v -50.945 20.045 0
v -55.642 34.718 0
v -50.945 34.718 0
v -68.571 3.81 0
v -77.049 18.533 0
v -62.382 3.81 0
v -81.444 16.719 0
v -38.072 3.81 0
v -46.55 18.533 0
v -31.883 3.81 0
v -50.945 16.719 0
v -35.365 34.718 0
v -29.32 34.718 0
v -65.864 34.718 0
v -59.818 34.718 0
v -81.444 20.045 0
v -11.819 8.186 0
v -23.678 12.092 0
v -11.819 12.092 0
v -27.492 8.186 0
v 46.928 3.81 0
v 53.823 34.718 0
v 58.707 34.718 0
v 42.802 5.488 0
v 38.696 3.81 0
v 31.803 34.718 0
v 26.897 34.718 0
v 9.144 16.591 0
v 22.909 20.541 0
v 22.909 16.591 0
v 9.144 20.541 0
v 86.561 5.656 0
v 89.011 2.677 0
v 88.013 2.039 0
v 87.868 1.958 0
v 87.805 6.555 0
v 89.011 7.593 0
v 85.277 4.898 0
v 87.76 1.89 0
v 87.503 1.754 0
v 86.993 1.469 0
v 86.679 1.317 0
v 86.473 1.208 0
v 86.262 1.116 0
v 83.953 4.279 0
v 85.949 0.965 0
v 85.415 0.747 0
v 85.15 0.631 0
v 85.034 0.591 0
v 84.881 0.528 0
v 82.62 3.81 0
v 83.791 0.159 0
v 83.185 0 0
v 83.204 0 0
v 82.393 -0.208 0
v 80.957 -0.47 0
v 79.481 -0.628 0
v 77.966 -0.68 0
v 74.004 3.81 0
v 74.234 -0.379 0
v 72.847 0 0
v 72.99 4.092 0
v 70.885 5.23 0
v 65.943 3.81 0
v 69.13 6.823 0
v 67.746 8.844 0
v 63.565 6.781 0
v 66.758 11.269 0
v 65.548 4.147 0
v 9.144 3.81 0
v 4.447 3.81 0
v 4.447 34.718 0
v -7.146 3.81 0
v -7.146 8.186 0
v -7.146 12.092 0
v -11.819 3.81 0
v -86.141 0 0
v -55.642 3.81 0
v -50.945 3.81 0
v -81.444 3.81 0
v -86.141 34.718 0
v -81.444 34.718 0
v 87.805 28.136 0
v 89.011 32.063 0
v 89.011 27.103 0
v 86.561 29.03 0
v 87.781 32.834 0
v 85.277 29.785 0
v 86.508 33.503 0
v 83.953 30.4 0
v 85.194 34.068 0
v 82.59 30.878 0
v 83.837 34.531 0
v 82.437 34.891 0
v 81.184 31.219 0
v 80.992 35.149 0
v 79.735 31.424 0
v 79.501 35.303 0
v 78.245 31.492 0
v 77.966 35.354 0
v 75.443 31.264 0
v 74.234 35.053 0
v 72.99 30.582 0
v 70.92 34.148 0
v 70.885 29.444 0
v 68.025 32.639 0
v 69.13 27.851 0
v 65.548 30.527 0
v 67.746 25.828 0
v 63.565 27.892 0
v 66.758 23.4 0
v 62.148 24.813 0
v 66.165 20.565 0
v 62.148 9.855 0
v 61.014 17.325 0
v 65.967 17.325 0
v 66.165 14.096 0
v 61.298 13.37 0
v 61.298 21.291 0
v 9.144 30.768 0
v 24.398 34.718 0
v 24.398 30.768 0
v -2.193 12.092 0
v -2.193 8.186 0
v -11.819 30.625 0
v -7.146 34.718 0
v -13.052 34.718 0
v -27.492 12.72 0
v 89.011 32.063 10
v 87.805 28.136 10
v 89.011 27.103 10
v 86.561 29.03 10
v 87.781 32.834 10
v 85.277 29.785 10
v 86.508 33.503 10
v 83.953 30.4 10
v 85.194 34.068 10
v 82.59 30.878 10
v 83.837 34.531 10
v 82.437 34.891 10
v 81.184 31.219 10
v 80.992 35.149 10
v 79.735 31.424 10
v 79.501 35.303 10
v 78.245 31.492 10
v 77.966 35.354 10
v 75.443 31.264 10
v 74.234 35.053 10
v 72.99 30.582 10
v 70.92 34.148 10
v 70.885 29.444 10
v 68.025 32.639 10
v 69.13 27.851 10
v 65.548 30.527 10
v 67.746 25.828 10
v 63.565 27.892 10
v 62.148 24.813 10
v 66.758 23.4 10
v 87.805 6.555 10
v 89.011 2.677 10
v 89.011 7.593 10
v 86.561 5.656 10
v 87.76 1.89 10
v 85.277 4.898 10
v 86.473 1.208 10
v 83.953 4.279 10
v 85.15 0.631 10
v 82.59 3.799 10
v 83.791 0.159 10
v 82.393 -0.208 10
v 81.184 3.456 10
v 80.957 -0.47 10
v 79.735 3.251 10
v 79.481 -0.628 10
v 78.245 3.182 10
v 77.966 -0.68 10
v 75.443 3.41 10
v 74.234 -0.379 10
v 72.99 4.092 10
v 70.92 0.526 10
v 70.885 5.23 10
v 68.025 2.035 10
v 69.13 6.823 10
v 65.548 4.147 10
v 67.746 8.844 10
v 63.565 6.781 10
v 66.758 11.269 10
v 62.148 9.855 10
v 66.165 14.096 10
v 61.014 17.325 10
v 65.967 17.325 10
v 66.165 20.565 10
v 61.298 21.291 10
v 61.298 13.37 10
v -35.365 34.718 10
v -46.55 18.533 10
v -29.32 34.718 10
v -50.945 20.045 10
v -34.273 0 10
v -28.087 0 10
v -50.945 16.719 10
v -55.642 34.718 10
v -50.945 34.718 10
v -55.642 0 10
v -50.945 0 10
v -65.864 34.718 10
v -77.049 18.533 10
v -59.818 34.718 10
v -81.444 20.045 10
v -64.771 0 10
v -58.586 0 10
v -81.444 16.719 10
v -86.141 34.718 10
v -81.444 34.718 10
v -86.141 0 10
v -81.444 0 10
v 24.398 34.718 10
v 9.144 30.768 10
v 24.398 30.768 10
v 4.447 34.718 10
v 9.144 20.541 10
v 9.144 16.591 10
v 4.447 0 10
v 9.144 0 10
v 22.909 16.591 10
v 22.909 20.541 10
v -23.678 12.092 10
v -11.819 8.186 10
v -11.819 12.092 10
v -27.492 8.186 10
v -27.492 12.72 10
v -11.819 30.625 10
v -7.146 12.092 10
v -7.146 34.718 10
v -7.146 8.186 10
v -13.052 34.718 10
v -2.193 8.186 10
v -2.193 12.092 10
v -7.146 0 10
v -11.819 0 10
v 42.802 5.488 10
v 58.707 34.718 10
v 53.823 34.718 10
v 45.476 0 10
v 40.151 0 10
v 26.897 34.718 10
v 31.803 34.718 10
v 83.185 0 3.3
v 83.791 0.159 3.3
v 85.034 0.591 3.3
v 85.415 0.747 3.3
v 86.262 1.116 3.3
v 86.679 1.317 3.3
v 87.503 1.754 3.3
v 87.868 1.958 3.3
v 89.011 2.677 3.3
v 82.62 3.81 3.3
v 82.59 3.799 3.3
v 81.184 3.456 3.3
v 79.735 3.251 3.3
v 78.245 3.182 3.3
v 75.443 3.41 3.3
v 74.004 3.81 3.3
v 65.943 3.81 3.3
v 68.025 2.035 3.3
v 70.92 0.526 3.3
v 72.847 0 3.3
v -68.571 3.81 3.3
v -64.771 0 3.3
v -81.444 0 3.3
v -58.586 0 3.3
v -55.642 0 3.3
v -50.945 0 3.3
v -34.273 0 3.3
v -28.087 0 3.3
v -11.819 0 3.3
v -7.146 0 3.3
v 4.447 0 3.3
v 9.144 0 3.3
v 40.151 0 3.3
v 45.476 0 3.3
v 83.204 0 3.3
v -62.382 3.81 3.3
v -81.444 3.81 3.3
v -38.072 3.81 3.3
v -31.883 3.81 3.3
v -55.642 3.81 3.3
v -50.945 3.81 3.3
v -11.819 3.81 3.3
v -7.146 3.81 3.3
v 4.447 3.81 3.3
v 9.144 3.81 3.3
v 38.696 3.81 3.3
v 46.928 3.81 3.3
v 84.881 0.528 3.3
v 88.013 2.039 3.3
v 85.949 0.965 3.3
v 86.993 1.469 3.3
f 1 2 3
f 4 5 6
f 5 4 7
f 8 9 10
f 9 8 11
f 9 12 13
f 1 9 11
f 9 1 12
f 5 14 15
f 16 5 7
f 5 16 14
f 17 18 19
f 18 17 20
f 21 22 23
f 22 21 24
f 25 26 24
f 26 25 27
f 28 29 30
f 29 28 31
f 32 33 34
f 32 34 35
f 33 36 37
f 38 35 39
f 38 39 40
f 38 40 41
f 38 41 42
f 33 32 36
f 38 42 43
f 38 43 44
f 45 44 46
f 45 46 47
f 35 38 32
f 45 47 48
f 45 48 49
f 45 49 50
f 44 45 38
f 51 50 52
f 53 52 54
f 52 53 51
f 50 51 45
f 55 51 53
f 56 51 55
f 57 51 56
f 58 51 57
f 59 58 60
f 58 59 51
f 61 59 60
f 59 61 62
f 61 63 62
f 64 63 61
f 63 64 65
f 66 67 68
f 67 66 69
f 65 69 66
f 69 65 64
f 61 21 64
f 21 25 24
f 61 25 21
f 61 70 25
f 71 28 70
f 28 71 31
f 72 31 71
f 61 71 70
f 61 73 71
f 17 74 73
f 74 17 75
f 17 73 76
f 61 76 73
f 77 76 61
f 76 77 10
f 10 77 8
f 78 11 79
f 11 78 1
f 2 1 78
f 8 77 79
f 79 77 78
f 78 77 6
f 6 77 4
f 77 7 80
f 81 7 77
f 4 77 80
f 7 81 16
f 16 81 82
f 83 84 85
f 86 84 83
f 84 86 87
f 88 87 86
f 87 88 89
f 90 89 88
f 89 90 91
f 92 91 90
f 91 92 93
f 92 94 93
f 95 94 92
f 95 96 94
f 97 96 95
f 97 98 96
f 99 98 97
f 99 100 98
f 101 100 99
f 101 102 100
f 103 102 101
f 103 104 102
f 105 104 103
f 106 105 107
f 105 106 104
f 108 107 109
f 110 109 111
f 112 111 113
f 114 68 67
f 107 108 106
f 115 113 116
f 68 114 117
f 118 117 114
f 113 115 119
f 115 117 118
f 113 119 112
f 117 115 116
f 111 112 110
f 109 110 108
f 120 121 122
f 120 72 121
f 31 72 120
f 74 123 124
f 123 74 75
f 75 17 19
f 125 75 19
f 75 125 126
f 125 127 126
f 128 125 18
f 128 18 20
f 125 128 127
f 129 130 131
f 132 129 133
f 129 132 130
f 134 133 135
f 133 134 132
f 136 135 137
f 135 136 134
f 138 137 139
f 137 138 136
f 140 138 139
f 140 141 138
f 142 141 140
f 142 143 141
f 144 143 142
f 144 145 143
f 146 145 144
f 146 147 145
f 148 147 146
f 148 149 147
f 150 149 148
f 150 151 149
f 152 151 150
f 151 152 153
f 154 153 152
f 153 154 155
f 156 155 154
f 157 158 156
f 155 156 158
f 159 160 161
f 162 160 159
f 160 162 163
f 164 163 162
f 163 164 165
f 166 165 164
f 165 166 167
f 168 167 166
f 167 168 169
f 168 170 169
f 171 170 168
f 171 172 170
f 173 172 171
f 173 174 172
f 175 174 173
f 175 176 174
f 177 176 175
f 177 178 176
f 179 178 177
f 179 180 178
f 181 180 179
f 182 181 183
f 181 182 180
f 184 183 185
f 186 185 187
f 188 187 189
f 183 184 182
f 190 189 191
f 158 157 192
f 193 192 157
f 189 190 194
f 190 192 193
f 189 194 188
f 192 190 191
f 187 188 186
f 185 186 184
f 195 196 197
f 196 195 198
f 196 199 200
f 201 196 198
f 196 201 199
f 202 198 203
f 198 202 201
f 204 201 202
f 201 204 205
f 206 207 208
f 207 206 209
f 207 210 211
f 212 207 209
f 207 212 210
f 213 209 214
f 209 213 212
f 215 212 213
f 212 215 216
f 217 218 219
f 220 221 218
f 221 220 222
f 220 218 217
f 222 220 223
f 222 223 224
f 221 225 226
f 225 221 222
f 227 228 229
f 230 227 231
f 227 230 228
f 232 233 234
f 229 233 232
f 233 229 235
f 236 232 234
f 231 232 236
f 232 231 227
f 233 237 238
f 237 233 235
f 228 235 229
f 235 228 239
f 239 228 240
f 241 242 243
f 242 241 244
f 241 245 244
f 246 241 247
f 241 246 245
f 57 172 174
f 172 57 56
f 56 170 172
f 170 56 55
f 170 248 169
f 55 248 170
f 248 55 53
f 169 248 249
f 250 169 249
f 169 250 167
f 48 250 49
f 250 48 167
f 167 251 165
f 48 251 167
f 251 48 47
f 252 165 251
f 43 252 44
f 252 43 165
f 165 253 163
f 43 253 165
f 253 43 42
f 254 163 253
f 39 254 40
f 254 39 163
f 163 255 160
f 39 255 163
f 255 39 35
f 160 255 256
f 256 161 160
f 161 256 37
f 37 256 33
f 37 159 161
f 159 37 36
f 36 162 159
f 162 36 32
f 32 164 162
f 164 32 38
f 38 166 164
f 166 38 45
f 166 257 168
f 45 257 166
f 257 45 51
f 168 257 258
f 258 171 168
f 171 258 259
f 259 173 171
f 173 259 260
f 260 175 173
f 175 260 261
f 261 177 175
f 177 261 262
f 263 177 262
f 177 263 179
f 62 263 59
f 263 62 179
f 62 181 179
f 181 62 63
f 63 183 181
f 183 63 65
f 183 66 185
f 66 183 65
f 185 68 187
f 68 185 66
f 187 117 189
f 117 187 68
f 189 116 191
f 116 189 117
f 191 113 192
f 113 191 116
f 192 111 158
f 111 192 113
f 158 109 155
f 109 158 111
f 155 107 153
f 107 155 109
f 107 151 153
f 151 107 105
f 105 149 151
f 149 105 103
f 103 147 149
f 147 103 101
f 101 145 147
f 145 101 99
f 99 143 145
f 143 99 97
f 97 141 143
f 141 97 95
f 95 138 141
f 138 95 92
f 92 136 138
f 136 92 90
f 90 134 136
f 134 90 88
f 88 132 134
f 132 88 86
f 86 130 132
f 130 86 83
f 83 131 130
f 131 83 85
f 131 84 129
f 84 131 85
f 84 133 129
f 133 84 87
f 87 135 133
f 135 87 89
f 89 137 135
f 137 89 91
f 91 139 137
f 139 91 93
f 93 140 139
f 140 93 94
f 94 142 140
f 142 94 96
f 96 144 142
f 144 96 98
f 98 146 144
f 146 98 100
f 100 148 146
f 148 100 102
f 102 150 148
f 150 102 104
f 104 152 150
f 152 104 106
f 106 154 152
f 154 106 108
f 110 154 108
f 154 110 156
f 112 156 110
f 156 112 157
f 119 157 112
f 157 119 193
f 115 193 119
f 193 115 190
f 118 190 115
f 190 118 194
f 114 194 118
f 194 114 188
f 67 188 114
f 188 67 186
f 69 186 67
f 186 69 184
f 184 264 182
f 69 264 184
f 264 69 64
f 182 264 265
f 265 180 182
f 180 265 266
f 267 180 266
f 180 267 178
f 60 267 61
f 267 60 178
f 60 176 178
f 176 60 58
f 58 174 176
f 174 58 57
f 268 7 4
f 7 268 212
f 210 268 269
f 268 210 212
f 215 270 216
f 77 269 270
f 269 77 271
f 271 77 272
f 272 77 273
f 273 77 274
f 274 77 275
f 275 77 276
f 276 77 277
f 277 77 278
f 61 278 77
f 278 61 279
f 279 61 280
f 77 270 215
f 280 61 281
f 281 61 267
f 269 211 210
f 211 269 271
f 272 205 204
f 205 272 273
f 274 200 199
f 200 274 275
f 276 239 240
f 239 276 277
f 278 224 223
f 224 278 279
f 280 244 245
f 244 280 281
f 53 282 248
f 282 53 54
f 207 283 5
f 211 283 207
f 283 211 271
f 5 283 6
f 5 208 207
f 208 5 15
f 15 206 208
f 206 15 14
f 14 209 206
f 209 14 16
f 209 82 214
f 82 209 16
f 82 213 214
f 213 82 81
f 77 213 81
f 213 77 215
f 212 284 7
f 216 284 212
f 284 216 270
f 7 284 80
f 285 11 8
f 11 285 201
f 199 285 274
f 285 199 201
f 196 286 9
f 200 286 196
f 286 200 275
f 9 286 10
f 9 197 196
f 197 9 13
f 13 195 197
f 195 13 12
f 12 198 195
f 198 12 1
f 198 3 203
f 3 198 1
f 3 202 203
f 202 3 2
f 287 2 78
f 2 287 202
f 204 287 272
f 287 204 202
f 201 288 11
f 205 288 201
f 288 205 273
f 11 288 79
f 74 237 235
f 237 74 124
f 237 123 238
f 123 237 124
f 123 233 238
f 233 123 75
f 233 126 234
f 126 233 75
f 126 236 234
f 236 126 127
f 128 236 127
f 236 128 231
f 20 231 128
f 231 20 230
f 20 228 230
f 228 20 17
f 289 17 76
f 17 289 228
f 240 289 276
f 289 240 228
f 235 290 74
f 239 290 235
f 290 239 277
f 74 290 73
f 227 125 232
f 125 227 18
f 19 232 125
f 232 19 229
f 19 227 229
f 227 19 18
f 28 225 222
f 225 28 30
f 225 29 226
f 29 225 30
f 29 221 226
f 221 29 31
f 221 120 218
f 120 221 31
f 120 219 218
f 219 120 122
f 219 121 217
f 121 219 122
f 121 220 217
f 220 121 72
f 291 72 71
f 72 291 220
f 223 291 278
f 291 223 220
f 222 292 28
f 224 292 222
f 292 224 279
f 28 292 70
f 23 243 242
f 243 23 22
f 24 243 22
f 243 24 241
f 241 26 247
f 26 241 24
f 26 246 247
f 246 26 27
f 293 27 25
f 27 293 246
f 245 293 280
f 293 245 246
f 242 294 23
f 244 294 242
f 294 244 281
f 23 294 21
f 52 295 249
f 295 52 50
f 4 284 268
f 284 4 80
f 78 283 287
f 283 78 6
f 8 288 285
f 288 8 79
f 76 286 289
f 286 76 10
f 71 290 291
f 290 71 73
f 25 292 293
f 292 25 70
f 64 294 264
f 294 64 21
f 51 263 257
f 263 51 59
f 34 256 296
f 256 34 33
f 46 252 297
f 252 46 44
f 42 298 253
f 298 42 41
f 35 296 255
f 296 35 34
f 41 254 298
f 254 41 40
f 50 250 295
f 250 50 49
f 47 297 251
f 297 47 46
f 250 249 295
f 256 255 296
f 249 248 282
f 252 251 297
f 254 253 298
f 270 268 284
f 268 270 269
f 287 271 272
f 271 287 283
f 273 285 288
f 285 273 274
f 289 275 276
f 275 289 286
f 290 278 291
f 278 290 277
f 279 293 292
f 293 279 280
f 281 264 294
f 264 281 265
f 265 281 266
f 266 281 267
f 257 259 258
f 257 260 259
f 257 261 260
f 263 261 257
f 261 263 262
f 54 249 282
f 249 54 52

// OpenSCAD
//Set the text to render
textstring="KK4FVC";

//Font name, e.g. "Libration Sans", "Aldo", depends on what is available on the platform. In the customizer,choose from about 700 Google Fonts. For an overview please refer: http://www.google.com/fonts
fontname="Passion One"; //[ABeeZee,Abel,Abril Fatface,Aclonica,Acme,Actor,Adamina,Advent Pro,Aguafina Script,Akronim,Aladin,Aldrich,Alef,Alegreya,Alegreya Sans,Alegreya Sans SC,Alegreya SC,Alex Brush,Alfa Slab One,Alice,Alike,Alike Angular,Allan,Allerta,Allerta Stencil,Allura,Almendra,Almendra Display,Almendra SC,Amarante,Amaranth,Amatic SC,Amethysta,Amiri,Anaheim,Andada,Andika,Angkor,Annie Use Your Telescope,Anonymous Pro,Antic,Antic Didone,Antic Slab,Anton,Arapey,Arbutus,Arbutus Slab,Architects Daughter,Archivo Black,Archivo Narrow,Arimo,Arizonia,Armata,Artifika,Arvo,Asap,Asset,Astloch,Asul,Atomic Age,Aubrey,Audiowide,Autour One,Average,Average Sans,Averia Gruesa Libre,Averia Libre,Averia Sans Libre,Averia Serif Libre,Bad Script,Balthazar,Bangers,Basic,Battambang,Baumans,Bayon,Belgrano,Belleza,BenchNine,Bentham,Berkshire Swash,Bevan,Bigelow Rules,Bigshot One,Bilbo,Bilbo Swash Caps,Bitter,Black Ops One,Bokor,Bonbon,Boogaloo,Bowlby One,Bowlby One SC,Brawler,Bree Serif,Bubblegum Sans,Bubbler One,Buda,Buenard,Butcherman,Butterfly Kids,Cabin,Cabin Condensed,Cabin Sketch,Caesar Dressing,Cagliostro,Calligraffitti,Cambay,Cambo,Candal,Cantarell,Cantata One,Cantora One,Capriola,Cardo,Carme,Carrois Gothic,Carrois Gothic SC,Carter One,Caudex,Cedarville Cursive,Ceviche One,Changa One,Chango,Chau Philomene One,Chela One,Chelsea Market,Chenla,Cherry Cream Soda,Cherry Swash,Chewy,Chicle,Chivo,Cinzel,Cinzel Decorative,Clicker Script,Coda,Coda Caption,Codystar,Combo,Comfortaa,Coming Soon,Concert One,Condiment,Content,Contrail One,Convergence,Cookie,Copse,Corben,Courgette,Cousine,Coustard,Covered By Your Grace,Crafty Girls,Creepster,Crete Round,Crimson Text,Croissant One,Crushed,Cuprum,Cutive,Cutive Mono,Damion,Dancing Script,Dangrek,Dawning of a New Day,Days One,Dekko,Delius,Delius Swash Caps,Delius Unicase,Della Respira,Denk One,Devonshire,Dhurjati,Didact Gothic,Diplomata,Diplomata SC,Domine,Donegal One,Doppio One,Dorsa,Dosis,Dr Sugiyama,Droid Sans,Droid Sans Mono,Droid Serif,Duru Sans,Dynalight,Eagle Lake,Eater,EB Garamond,Economica,Ek Mukta,Electrolize,Elsie,Elsie Swash Caps,Emblema One,Emilys Candy,Engagement,Englebert,Enriqueta,Erica One,Esteban,Euphoria Script,Ewert,Exo,Exo 2,Expletus Sans,Fanwood Text,Fascinate,Fascinate Inline,Faster One,Fasthand,Fauna One,Federant,Federo,Felipa,Fenix,Finger Paint,Fira Mono,Fira Sans,Fjalla One,Fjord One,Flamenco,Flavors,Fondamento,Fontdiner Swanky,Forum,Francois One,Freckle Face,Fredericka the Great,Fredoka One,Freehand,Fresca,Frijole,Fruktur,Fugaz One,Gabriela,Gafata,Galdeano,Galindo,Gentium Basic,Gentium Book Basic,Geo,Geostar,Geostar Fill,Germania One,GFS Didot,GFS Neohellenic,Gidugu,Gilda Display,Give You Glory,Glass Antiqua,Glegoo,Gloria Hallelujah,Goblin One,Gochi Hand,Gorditas,Goudy Bookletter 1911,Graduate,Grand Hotel,Gravitas One,Great Vibes,Griffy,Gruppo,Gudea,Gurajada,Habibi,Halant,Hammersmith One,Hanalei,Hanalei Fill,Handlee,Hanuman,Happy Monkey,Headland One,Henny Penny,Herr Von Muellerhoff,Hind,Holtwood One SC,Homemade Apple,Homenaje,Iceberg,Iceland,IM Fell Double Pica,IM Fell Double Pica SC,IM Fell DW Pica,IM Fell DW Pica SC,IM Fell English,IM Fell English SC,IM Fell French Canon,IM Fell French Canon SC,IM Fell Great Primer,IM Fell Great Primer SC,Imprima,Inconsolata,Inder,Indie Flower,Inika,Irish Grover,Istok Web,Italiana,Italianno,Jacques Francois,Jacques Francois Shadow,Jim Nightshade,Jockey One,Jolly Lodger,Josefin Sans,Josefin Slab,Joti One,Judson,Julee,Julius Sans One,Junge,Jura,Just Another Hand,Just Me Again Down Here,Kalam,Kameron,Kantumruy,Karla,Karma,Kaushan Script,Kavoon,Kdam Thmor,Keania One,Kelly Slab,Kenia,Khand,Khmer,Khula,Kite One,Knewave,Kotta One,Koulen,Kranky,Kreon,Kristi,Krona One,La Belle Aurore,Laila,Lakki Reddy,Lancelot,Lateef,Lato,League Script,Leckerli One,Ledger,Lekton,Lemon,Liberation Sans,Libre Baskerville,Life Savers,Lilita One,Lily Script One,Limelight,Linden Hill,Lobster,Lobster Two,Londrina Outline,Londrina Shadow,Londrina Sketch,Londrina Solid,Lora,Love Ya Like A Sister,Loved by the King,Lovers Quarrel,Luckiest Guy,Lusitana,Lustria,Macondo,Macondo Swash Caps,Magra,Maiden Orange,Mako,Mallanna,Mandali,Marcellus,Marcellus SC,Marck Script,Margarine,Marko One,Marmelad,Martel Sans,Marvel,Mate,Mate SC,Maven Pro,McLaren,Meddon,MedievalSharp,Medula One,Megrim,Meie Script,Merienda,Merienda One,Merriweather,Merriweather Sans,Metal,Metal Mania,Metamorphous,Metrophobic,Michroma,Milonga,Miltonian,Miltonian Tattoo,Miniver,Miss Fajardose,Modak,Modern Antiqua,Molengo,Molle,Monda,Monofett,Monoton,Monsieur La Doulaise,Montaga,Montez,Montserrat,Montserrat Alternates,Montserrat Subrayada,Moul,Moulpali,Mountains of Christmas,Mouse Memoirs,Mr Bedfort,Mr Dafoe,Mr De Haviland,Mrs Saint Delafield,Mrs Sheppards,Muli,Mystery Quest,Neucha,Neuton,New Rocker,News Cycle,Niconne,Nixie One,Nobile,Nokora,Norican,Nosifer,Nothing You Could Do,Noticia Text,Noto Sans,Noto Serif,Nova Cut,Nova Flat,Nova Mono,Nova Oval,Nova Round,Nova Script,Nova Slim,Nova Square,NTR,Numans,Nunito,Odor Mean Chey,Offside,Old Standard TT,Oldenburg,Oleo Script,Oleo Script Swash Caps,Open Sans,Open Sans Condensed,Oranienbaum,Orbitron,Oregano,Orienta,Original Surfer,Oswald,Over the Rainbow,Overlock,Overlock SC,Ovo,Oxygen,Oxygen Mono,Pacifico,Paprika,Parisienne,Passero One,Passion One,Pathway Gothic One,Patrick Hand,Patrick Hand SC,Patua One,Paytone One,Peddana,Peralta,Permanent Marker,Petit Formal Script,Petrona,Philosopher,Piedra,Pinyon Script,Pirata One,Plaster,Play,Playball,Playfair Display,Playfair Display SC,Podkova,Poiret One,Poller One,Poly,Pompiere,Pontano Sans,Port Lligat Sans,Port Lligat Slab,Prata,Preahvihear,Press Start 2P,Princess Sofia,Prociono,Prosto One,PT Mono,PT Sans,PT Sans Caption,PT Sans Narrow,PT Serif,PT Serif Caption,Puritan,Purple Purse,Quando,Quantico,Quattrocento,Quattrocento Sans,Questrial,Quicksand,Quintessential,Qwigley,Racing Sans One,Radley,Rajdhani,Raleway,Raleway Dots,Ramabhadra,Ramaraja,Rambla,Rammetto One,Ranchers,Rancho,Ranga,Rationale,Ravi Prakash,Redressed,Reenie Beanie,Revalia,Ribeye,Ribeye Marrow,Righteous,Risque,Roboto,Roboto Condensed,Roboto Slab,Rochester,Rock Salt,Rokkitt,Romanesco,Ropa Sans,Rosario,Rosarivo,Rouge Script,Rozha One,Rubik Mono One,Rubik One,Ruda,Rufina,Ruge Boogie,Ruluko,Rum Raisin,Ruslan Display,Russo One,Ruthie,Rye,Sacramento,Sail,Salsa,Sanchez,Sancreek,Sansita One,Sarina,Sarpanch,Satisfy,Scada,Scheherazade,Schoolbell,Seaweed Script,Sevillana,Seymour One,Shadows Into Light,Shadows Into Light Two,Shanti,Share,Share Tech,Share Tech Mono,Shojumaru,Short Stack,Siemreap,Sigmar One,Signika,Signika Negative,Simonetta,Sintony,Sirin Stencil,Six Caps,Skranji,Slabo 13px,Slabo 27px,Slackey,Smokum,Smythe,Sniglet,Snippet,Snowburst One,Sofadi One,Sofia,Sonsie One,Sorts Mill Goudy,Source Code Pro,Source Sans Pro,Source Serif Pro,Special Elite,Spicy Rice,Spinnaker,Spirax,Squada One,Sree Krushnadevaraya,Stalemate,Stalinist One,Stardos Stencil,Stint Ultra Condensed,Stint Ultra Expanded,Stoke,Strait,Sue Ellen Francisco,Sunshiney,Supermercado One,Suranna,Suravaram,Suwannaphum,Swanky and Moo Moo,Syncopate,Tangerine,Taprom,Tauri,Teko,Telex,Tenali Ramakrishna,Tenor Sans,Text Me One,The Girl Next Door,Tienne,Timmana,Tinos,Titan One,Titillium Web,Trade Winds,Trocchi,Trochut,Trykker,Tulpen One,Ubuntu,Ubuntu Condensed,Ubuntu Mono,Ultra,Uncial Antiqua,Underdog,Unica One,UnifrakturCook,UnifrakturMaguntia,Unkempt,Unlock,Unna,Vampiro One,Varela,Varela Round,Vast Shadow,Vesper Libre,Vibur,Vidaloka,Viga,Voces,Volkhov,Vollkorn,Voltaire,VT323,Waiting for the Sunrise,Wallpoet,Walter Turncoat,Warnes,Wellfleet,Wendy One,Wire One,Yanone Kaffeesatz,Yellowtail,Yeseva One,Yesteryear,Zeyada]

//Use a rounded base to connect all letters or use a connecting bar?
RoundedBase=0; //[0, 1]

//Shift the font up/down to connect i and j dots? Select "no" if you have no i or j in your text.
do_shift_font="automatic"; //[automatic,yes,no]

//Set font size in mm
textsize=38.1; 

//Text height (extrusion) in mm
textheight=10;

//Connecting bar height (extrusion in print direction) in percent of the text height
baseheight_percent=.33;
baseheight=textheight*baseheight_percent;

//Connecting bar thickness in percent of the font size
basethickness_percent=0.1;
basethickness=textsize*basethickness_percent;

//Amount to shift the font up/down to connect i and j dots for printing. 
font_catch_diacritical_sign=2.3; 

//Only for a rounded base: Base increase size to make letters meet, in percent of the textsize
base_radius_add_percent=.1;
base_radius_add=textsize*base_radius_add_percent;

/* [Hidden] */
//-------------------------------------------------------------------------------

iorj = [ for (i = [0 : len(textstring) - 1]) if (textstring[i]=="i" || textstring[i]=="j") 1 ];

dummy_cutoutlen=len(textstring)*textsize;

/*
Name and Text
Version F, March 2015
Written by MC Geisler (mcgenki at gmail dot com)

This is a proper configurable name plate, consisting of separate extruded letters. Use the variables to get the text you need.

Each letter and also the dots of 'i' and 'j' are connected together, so after printing it will not fall apart.

Use it to create mini name tags (the text in the picture is 9mm high) or big text sculptures!

Have fun!

License: Attribution 4.0 International (CC BY 4.0)

You are free to:
    Share - copy and redistribute the material in any medium or format
    Adapt - remix, transform, and build upon the material
    for any purpose, even commercially.
*/


    
module writetext(textstr, sizeit)
{
    text(textstr,size=sizeit*.9,font=fontname,halign="center",valign="baseline");
}

module RiseText(textstr, textsize,textheight) 
{

    linear_extrude(height=textheight,convexity = 10)
        writetext(textstr, textsize);

    //create base
    if(RoundedBase==0)
    {
        //base line to connect
        linear_extrude(height=baseheight, twist=0, slices=1, $fn=32) 
            hull()
                intersection()
                {
                    writetext(textstr, textsize);
                    
                    //translate([0,-textsize/2+basethickness/2+base_offset,0])
                    translate([0,basethickness/2,0])
                       square([dummy_cutoutlen,basethickness],center=true);
                }
              
        if ( (do_shift_font=="automatic" && iorj[0]==1) || do_shift_font=="yes")  
        {
            //connect i and j dots
            assign(delta=textsize/30*font_catch_diacritical_sign)
               intersection()
               {
                   //connect the dots but maybe too much in other locations
                   linear_extrude(height=baseheight/2,convexity = 10)
                        offset(delta=-delta)   
                            offset(delta=delta)
                                writetext(textstr, textsize);
               
                   //connect only vertical parts by shifting
                   linear_extrude(height=baseheight/2,convexity = 10)
                       for ( i = [-1 : 1] )
                           translate([0,i*delta,0])
                                writetext(textstr, textsize);
               }
       }

    }
    else        
    {
                linear_extrude(height=baseheight, twist=0, slices=1, $fn=32) 
                    offset(r = base_radius_add) 
                    {
                        writetext(textstr, textsize);
                    }
    }

}

RiseText(textstring,textsize,textheight);
